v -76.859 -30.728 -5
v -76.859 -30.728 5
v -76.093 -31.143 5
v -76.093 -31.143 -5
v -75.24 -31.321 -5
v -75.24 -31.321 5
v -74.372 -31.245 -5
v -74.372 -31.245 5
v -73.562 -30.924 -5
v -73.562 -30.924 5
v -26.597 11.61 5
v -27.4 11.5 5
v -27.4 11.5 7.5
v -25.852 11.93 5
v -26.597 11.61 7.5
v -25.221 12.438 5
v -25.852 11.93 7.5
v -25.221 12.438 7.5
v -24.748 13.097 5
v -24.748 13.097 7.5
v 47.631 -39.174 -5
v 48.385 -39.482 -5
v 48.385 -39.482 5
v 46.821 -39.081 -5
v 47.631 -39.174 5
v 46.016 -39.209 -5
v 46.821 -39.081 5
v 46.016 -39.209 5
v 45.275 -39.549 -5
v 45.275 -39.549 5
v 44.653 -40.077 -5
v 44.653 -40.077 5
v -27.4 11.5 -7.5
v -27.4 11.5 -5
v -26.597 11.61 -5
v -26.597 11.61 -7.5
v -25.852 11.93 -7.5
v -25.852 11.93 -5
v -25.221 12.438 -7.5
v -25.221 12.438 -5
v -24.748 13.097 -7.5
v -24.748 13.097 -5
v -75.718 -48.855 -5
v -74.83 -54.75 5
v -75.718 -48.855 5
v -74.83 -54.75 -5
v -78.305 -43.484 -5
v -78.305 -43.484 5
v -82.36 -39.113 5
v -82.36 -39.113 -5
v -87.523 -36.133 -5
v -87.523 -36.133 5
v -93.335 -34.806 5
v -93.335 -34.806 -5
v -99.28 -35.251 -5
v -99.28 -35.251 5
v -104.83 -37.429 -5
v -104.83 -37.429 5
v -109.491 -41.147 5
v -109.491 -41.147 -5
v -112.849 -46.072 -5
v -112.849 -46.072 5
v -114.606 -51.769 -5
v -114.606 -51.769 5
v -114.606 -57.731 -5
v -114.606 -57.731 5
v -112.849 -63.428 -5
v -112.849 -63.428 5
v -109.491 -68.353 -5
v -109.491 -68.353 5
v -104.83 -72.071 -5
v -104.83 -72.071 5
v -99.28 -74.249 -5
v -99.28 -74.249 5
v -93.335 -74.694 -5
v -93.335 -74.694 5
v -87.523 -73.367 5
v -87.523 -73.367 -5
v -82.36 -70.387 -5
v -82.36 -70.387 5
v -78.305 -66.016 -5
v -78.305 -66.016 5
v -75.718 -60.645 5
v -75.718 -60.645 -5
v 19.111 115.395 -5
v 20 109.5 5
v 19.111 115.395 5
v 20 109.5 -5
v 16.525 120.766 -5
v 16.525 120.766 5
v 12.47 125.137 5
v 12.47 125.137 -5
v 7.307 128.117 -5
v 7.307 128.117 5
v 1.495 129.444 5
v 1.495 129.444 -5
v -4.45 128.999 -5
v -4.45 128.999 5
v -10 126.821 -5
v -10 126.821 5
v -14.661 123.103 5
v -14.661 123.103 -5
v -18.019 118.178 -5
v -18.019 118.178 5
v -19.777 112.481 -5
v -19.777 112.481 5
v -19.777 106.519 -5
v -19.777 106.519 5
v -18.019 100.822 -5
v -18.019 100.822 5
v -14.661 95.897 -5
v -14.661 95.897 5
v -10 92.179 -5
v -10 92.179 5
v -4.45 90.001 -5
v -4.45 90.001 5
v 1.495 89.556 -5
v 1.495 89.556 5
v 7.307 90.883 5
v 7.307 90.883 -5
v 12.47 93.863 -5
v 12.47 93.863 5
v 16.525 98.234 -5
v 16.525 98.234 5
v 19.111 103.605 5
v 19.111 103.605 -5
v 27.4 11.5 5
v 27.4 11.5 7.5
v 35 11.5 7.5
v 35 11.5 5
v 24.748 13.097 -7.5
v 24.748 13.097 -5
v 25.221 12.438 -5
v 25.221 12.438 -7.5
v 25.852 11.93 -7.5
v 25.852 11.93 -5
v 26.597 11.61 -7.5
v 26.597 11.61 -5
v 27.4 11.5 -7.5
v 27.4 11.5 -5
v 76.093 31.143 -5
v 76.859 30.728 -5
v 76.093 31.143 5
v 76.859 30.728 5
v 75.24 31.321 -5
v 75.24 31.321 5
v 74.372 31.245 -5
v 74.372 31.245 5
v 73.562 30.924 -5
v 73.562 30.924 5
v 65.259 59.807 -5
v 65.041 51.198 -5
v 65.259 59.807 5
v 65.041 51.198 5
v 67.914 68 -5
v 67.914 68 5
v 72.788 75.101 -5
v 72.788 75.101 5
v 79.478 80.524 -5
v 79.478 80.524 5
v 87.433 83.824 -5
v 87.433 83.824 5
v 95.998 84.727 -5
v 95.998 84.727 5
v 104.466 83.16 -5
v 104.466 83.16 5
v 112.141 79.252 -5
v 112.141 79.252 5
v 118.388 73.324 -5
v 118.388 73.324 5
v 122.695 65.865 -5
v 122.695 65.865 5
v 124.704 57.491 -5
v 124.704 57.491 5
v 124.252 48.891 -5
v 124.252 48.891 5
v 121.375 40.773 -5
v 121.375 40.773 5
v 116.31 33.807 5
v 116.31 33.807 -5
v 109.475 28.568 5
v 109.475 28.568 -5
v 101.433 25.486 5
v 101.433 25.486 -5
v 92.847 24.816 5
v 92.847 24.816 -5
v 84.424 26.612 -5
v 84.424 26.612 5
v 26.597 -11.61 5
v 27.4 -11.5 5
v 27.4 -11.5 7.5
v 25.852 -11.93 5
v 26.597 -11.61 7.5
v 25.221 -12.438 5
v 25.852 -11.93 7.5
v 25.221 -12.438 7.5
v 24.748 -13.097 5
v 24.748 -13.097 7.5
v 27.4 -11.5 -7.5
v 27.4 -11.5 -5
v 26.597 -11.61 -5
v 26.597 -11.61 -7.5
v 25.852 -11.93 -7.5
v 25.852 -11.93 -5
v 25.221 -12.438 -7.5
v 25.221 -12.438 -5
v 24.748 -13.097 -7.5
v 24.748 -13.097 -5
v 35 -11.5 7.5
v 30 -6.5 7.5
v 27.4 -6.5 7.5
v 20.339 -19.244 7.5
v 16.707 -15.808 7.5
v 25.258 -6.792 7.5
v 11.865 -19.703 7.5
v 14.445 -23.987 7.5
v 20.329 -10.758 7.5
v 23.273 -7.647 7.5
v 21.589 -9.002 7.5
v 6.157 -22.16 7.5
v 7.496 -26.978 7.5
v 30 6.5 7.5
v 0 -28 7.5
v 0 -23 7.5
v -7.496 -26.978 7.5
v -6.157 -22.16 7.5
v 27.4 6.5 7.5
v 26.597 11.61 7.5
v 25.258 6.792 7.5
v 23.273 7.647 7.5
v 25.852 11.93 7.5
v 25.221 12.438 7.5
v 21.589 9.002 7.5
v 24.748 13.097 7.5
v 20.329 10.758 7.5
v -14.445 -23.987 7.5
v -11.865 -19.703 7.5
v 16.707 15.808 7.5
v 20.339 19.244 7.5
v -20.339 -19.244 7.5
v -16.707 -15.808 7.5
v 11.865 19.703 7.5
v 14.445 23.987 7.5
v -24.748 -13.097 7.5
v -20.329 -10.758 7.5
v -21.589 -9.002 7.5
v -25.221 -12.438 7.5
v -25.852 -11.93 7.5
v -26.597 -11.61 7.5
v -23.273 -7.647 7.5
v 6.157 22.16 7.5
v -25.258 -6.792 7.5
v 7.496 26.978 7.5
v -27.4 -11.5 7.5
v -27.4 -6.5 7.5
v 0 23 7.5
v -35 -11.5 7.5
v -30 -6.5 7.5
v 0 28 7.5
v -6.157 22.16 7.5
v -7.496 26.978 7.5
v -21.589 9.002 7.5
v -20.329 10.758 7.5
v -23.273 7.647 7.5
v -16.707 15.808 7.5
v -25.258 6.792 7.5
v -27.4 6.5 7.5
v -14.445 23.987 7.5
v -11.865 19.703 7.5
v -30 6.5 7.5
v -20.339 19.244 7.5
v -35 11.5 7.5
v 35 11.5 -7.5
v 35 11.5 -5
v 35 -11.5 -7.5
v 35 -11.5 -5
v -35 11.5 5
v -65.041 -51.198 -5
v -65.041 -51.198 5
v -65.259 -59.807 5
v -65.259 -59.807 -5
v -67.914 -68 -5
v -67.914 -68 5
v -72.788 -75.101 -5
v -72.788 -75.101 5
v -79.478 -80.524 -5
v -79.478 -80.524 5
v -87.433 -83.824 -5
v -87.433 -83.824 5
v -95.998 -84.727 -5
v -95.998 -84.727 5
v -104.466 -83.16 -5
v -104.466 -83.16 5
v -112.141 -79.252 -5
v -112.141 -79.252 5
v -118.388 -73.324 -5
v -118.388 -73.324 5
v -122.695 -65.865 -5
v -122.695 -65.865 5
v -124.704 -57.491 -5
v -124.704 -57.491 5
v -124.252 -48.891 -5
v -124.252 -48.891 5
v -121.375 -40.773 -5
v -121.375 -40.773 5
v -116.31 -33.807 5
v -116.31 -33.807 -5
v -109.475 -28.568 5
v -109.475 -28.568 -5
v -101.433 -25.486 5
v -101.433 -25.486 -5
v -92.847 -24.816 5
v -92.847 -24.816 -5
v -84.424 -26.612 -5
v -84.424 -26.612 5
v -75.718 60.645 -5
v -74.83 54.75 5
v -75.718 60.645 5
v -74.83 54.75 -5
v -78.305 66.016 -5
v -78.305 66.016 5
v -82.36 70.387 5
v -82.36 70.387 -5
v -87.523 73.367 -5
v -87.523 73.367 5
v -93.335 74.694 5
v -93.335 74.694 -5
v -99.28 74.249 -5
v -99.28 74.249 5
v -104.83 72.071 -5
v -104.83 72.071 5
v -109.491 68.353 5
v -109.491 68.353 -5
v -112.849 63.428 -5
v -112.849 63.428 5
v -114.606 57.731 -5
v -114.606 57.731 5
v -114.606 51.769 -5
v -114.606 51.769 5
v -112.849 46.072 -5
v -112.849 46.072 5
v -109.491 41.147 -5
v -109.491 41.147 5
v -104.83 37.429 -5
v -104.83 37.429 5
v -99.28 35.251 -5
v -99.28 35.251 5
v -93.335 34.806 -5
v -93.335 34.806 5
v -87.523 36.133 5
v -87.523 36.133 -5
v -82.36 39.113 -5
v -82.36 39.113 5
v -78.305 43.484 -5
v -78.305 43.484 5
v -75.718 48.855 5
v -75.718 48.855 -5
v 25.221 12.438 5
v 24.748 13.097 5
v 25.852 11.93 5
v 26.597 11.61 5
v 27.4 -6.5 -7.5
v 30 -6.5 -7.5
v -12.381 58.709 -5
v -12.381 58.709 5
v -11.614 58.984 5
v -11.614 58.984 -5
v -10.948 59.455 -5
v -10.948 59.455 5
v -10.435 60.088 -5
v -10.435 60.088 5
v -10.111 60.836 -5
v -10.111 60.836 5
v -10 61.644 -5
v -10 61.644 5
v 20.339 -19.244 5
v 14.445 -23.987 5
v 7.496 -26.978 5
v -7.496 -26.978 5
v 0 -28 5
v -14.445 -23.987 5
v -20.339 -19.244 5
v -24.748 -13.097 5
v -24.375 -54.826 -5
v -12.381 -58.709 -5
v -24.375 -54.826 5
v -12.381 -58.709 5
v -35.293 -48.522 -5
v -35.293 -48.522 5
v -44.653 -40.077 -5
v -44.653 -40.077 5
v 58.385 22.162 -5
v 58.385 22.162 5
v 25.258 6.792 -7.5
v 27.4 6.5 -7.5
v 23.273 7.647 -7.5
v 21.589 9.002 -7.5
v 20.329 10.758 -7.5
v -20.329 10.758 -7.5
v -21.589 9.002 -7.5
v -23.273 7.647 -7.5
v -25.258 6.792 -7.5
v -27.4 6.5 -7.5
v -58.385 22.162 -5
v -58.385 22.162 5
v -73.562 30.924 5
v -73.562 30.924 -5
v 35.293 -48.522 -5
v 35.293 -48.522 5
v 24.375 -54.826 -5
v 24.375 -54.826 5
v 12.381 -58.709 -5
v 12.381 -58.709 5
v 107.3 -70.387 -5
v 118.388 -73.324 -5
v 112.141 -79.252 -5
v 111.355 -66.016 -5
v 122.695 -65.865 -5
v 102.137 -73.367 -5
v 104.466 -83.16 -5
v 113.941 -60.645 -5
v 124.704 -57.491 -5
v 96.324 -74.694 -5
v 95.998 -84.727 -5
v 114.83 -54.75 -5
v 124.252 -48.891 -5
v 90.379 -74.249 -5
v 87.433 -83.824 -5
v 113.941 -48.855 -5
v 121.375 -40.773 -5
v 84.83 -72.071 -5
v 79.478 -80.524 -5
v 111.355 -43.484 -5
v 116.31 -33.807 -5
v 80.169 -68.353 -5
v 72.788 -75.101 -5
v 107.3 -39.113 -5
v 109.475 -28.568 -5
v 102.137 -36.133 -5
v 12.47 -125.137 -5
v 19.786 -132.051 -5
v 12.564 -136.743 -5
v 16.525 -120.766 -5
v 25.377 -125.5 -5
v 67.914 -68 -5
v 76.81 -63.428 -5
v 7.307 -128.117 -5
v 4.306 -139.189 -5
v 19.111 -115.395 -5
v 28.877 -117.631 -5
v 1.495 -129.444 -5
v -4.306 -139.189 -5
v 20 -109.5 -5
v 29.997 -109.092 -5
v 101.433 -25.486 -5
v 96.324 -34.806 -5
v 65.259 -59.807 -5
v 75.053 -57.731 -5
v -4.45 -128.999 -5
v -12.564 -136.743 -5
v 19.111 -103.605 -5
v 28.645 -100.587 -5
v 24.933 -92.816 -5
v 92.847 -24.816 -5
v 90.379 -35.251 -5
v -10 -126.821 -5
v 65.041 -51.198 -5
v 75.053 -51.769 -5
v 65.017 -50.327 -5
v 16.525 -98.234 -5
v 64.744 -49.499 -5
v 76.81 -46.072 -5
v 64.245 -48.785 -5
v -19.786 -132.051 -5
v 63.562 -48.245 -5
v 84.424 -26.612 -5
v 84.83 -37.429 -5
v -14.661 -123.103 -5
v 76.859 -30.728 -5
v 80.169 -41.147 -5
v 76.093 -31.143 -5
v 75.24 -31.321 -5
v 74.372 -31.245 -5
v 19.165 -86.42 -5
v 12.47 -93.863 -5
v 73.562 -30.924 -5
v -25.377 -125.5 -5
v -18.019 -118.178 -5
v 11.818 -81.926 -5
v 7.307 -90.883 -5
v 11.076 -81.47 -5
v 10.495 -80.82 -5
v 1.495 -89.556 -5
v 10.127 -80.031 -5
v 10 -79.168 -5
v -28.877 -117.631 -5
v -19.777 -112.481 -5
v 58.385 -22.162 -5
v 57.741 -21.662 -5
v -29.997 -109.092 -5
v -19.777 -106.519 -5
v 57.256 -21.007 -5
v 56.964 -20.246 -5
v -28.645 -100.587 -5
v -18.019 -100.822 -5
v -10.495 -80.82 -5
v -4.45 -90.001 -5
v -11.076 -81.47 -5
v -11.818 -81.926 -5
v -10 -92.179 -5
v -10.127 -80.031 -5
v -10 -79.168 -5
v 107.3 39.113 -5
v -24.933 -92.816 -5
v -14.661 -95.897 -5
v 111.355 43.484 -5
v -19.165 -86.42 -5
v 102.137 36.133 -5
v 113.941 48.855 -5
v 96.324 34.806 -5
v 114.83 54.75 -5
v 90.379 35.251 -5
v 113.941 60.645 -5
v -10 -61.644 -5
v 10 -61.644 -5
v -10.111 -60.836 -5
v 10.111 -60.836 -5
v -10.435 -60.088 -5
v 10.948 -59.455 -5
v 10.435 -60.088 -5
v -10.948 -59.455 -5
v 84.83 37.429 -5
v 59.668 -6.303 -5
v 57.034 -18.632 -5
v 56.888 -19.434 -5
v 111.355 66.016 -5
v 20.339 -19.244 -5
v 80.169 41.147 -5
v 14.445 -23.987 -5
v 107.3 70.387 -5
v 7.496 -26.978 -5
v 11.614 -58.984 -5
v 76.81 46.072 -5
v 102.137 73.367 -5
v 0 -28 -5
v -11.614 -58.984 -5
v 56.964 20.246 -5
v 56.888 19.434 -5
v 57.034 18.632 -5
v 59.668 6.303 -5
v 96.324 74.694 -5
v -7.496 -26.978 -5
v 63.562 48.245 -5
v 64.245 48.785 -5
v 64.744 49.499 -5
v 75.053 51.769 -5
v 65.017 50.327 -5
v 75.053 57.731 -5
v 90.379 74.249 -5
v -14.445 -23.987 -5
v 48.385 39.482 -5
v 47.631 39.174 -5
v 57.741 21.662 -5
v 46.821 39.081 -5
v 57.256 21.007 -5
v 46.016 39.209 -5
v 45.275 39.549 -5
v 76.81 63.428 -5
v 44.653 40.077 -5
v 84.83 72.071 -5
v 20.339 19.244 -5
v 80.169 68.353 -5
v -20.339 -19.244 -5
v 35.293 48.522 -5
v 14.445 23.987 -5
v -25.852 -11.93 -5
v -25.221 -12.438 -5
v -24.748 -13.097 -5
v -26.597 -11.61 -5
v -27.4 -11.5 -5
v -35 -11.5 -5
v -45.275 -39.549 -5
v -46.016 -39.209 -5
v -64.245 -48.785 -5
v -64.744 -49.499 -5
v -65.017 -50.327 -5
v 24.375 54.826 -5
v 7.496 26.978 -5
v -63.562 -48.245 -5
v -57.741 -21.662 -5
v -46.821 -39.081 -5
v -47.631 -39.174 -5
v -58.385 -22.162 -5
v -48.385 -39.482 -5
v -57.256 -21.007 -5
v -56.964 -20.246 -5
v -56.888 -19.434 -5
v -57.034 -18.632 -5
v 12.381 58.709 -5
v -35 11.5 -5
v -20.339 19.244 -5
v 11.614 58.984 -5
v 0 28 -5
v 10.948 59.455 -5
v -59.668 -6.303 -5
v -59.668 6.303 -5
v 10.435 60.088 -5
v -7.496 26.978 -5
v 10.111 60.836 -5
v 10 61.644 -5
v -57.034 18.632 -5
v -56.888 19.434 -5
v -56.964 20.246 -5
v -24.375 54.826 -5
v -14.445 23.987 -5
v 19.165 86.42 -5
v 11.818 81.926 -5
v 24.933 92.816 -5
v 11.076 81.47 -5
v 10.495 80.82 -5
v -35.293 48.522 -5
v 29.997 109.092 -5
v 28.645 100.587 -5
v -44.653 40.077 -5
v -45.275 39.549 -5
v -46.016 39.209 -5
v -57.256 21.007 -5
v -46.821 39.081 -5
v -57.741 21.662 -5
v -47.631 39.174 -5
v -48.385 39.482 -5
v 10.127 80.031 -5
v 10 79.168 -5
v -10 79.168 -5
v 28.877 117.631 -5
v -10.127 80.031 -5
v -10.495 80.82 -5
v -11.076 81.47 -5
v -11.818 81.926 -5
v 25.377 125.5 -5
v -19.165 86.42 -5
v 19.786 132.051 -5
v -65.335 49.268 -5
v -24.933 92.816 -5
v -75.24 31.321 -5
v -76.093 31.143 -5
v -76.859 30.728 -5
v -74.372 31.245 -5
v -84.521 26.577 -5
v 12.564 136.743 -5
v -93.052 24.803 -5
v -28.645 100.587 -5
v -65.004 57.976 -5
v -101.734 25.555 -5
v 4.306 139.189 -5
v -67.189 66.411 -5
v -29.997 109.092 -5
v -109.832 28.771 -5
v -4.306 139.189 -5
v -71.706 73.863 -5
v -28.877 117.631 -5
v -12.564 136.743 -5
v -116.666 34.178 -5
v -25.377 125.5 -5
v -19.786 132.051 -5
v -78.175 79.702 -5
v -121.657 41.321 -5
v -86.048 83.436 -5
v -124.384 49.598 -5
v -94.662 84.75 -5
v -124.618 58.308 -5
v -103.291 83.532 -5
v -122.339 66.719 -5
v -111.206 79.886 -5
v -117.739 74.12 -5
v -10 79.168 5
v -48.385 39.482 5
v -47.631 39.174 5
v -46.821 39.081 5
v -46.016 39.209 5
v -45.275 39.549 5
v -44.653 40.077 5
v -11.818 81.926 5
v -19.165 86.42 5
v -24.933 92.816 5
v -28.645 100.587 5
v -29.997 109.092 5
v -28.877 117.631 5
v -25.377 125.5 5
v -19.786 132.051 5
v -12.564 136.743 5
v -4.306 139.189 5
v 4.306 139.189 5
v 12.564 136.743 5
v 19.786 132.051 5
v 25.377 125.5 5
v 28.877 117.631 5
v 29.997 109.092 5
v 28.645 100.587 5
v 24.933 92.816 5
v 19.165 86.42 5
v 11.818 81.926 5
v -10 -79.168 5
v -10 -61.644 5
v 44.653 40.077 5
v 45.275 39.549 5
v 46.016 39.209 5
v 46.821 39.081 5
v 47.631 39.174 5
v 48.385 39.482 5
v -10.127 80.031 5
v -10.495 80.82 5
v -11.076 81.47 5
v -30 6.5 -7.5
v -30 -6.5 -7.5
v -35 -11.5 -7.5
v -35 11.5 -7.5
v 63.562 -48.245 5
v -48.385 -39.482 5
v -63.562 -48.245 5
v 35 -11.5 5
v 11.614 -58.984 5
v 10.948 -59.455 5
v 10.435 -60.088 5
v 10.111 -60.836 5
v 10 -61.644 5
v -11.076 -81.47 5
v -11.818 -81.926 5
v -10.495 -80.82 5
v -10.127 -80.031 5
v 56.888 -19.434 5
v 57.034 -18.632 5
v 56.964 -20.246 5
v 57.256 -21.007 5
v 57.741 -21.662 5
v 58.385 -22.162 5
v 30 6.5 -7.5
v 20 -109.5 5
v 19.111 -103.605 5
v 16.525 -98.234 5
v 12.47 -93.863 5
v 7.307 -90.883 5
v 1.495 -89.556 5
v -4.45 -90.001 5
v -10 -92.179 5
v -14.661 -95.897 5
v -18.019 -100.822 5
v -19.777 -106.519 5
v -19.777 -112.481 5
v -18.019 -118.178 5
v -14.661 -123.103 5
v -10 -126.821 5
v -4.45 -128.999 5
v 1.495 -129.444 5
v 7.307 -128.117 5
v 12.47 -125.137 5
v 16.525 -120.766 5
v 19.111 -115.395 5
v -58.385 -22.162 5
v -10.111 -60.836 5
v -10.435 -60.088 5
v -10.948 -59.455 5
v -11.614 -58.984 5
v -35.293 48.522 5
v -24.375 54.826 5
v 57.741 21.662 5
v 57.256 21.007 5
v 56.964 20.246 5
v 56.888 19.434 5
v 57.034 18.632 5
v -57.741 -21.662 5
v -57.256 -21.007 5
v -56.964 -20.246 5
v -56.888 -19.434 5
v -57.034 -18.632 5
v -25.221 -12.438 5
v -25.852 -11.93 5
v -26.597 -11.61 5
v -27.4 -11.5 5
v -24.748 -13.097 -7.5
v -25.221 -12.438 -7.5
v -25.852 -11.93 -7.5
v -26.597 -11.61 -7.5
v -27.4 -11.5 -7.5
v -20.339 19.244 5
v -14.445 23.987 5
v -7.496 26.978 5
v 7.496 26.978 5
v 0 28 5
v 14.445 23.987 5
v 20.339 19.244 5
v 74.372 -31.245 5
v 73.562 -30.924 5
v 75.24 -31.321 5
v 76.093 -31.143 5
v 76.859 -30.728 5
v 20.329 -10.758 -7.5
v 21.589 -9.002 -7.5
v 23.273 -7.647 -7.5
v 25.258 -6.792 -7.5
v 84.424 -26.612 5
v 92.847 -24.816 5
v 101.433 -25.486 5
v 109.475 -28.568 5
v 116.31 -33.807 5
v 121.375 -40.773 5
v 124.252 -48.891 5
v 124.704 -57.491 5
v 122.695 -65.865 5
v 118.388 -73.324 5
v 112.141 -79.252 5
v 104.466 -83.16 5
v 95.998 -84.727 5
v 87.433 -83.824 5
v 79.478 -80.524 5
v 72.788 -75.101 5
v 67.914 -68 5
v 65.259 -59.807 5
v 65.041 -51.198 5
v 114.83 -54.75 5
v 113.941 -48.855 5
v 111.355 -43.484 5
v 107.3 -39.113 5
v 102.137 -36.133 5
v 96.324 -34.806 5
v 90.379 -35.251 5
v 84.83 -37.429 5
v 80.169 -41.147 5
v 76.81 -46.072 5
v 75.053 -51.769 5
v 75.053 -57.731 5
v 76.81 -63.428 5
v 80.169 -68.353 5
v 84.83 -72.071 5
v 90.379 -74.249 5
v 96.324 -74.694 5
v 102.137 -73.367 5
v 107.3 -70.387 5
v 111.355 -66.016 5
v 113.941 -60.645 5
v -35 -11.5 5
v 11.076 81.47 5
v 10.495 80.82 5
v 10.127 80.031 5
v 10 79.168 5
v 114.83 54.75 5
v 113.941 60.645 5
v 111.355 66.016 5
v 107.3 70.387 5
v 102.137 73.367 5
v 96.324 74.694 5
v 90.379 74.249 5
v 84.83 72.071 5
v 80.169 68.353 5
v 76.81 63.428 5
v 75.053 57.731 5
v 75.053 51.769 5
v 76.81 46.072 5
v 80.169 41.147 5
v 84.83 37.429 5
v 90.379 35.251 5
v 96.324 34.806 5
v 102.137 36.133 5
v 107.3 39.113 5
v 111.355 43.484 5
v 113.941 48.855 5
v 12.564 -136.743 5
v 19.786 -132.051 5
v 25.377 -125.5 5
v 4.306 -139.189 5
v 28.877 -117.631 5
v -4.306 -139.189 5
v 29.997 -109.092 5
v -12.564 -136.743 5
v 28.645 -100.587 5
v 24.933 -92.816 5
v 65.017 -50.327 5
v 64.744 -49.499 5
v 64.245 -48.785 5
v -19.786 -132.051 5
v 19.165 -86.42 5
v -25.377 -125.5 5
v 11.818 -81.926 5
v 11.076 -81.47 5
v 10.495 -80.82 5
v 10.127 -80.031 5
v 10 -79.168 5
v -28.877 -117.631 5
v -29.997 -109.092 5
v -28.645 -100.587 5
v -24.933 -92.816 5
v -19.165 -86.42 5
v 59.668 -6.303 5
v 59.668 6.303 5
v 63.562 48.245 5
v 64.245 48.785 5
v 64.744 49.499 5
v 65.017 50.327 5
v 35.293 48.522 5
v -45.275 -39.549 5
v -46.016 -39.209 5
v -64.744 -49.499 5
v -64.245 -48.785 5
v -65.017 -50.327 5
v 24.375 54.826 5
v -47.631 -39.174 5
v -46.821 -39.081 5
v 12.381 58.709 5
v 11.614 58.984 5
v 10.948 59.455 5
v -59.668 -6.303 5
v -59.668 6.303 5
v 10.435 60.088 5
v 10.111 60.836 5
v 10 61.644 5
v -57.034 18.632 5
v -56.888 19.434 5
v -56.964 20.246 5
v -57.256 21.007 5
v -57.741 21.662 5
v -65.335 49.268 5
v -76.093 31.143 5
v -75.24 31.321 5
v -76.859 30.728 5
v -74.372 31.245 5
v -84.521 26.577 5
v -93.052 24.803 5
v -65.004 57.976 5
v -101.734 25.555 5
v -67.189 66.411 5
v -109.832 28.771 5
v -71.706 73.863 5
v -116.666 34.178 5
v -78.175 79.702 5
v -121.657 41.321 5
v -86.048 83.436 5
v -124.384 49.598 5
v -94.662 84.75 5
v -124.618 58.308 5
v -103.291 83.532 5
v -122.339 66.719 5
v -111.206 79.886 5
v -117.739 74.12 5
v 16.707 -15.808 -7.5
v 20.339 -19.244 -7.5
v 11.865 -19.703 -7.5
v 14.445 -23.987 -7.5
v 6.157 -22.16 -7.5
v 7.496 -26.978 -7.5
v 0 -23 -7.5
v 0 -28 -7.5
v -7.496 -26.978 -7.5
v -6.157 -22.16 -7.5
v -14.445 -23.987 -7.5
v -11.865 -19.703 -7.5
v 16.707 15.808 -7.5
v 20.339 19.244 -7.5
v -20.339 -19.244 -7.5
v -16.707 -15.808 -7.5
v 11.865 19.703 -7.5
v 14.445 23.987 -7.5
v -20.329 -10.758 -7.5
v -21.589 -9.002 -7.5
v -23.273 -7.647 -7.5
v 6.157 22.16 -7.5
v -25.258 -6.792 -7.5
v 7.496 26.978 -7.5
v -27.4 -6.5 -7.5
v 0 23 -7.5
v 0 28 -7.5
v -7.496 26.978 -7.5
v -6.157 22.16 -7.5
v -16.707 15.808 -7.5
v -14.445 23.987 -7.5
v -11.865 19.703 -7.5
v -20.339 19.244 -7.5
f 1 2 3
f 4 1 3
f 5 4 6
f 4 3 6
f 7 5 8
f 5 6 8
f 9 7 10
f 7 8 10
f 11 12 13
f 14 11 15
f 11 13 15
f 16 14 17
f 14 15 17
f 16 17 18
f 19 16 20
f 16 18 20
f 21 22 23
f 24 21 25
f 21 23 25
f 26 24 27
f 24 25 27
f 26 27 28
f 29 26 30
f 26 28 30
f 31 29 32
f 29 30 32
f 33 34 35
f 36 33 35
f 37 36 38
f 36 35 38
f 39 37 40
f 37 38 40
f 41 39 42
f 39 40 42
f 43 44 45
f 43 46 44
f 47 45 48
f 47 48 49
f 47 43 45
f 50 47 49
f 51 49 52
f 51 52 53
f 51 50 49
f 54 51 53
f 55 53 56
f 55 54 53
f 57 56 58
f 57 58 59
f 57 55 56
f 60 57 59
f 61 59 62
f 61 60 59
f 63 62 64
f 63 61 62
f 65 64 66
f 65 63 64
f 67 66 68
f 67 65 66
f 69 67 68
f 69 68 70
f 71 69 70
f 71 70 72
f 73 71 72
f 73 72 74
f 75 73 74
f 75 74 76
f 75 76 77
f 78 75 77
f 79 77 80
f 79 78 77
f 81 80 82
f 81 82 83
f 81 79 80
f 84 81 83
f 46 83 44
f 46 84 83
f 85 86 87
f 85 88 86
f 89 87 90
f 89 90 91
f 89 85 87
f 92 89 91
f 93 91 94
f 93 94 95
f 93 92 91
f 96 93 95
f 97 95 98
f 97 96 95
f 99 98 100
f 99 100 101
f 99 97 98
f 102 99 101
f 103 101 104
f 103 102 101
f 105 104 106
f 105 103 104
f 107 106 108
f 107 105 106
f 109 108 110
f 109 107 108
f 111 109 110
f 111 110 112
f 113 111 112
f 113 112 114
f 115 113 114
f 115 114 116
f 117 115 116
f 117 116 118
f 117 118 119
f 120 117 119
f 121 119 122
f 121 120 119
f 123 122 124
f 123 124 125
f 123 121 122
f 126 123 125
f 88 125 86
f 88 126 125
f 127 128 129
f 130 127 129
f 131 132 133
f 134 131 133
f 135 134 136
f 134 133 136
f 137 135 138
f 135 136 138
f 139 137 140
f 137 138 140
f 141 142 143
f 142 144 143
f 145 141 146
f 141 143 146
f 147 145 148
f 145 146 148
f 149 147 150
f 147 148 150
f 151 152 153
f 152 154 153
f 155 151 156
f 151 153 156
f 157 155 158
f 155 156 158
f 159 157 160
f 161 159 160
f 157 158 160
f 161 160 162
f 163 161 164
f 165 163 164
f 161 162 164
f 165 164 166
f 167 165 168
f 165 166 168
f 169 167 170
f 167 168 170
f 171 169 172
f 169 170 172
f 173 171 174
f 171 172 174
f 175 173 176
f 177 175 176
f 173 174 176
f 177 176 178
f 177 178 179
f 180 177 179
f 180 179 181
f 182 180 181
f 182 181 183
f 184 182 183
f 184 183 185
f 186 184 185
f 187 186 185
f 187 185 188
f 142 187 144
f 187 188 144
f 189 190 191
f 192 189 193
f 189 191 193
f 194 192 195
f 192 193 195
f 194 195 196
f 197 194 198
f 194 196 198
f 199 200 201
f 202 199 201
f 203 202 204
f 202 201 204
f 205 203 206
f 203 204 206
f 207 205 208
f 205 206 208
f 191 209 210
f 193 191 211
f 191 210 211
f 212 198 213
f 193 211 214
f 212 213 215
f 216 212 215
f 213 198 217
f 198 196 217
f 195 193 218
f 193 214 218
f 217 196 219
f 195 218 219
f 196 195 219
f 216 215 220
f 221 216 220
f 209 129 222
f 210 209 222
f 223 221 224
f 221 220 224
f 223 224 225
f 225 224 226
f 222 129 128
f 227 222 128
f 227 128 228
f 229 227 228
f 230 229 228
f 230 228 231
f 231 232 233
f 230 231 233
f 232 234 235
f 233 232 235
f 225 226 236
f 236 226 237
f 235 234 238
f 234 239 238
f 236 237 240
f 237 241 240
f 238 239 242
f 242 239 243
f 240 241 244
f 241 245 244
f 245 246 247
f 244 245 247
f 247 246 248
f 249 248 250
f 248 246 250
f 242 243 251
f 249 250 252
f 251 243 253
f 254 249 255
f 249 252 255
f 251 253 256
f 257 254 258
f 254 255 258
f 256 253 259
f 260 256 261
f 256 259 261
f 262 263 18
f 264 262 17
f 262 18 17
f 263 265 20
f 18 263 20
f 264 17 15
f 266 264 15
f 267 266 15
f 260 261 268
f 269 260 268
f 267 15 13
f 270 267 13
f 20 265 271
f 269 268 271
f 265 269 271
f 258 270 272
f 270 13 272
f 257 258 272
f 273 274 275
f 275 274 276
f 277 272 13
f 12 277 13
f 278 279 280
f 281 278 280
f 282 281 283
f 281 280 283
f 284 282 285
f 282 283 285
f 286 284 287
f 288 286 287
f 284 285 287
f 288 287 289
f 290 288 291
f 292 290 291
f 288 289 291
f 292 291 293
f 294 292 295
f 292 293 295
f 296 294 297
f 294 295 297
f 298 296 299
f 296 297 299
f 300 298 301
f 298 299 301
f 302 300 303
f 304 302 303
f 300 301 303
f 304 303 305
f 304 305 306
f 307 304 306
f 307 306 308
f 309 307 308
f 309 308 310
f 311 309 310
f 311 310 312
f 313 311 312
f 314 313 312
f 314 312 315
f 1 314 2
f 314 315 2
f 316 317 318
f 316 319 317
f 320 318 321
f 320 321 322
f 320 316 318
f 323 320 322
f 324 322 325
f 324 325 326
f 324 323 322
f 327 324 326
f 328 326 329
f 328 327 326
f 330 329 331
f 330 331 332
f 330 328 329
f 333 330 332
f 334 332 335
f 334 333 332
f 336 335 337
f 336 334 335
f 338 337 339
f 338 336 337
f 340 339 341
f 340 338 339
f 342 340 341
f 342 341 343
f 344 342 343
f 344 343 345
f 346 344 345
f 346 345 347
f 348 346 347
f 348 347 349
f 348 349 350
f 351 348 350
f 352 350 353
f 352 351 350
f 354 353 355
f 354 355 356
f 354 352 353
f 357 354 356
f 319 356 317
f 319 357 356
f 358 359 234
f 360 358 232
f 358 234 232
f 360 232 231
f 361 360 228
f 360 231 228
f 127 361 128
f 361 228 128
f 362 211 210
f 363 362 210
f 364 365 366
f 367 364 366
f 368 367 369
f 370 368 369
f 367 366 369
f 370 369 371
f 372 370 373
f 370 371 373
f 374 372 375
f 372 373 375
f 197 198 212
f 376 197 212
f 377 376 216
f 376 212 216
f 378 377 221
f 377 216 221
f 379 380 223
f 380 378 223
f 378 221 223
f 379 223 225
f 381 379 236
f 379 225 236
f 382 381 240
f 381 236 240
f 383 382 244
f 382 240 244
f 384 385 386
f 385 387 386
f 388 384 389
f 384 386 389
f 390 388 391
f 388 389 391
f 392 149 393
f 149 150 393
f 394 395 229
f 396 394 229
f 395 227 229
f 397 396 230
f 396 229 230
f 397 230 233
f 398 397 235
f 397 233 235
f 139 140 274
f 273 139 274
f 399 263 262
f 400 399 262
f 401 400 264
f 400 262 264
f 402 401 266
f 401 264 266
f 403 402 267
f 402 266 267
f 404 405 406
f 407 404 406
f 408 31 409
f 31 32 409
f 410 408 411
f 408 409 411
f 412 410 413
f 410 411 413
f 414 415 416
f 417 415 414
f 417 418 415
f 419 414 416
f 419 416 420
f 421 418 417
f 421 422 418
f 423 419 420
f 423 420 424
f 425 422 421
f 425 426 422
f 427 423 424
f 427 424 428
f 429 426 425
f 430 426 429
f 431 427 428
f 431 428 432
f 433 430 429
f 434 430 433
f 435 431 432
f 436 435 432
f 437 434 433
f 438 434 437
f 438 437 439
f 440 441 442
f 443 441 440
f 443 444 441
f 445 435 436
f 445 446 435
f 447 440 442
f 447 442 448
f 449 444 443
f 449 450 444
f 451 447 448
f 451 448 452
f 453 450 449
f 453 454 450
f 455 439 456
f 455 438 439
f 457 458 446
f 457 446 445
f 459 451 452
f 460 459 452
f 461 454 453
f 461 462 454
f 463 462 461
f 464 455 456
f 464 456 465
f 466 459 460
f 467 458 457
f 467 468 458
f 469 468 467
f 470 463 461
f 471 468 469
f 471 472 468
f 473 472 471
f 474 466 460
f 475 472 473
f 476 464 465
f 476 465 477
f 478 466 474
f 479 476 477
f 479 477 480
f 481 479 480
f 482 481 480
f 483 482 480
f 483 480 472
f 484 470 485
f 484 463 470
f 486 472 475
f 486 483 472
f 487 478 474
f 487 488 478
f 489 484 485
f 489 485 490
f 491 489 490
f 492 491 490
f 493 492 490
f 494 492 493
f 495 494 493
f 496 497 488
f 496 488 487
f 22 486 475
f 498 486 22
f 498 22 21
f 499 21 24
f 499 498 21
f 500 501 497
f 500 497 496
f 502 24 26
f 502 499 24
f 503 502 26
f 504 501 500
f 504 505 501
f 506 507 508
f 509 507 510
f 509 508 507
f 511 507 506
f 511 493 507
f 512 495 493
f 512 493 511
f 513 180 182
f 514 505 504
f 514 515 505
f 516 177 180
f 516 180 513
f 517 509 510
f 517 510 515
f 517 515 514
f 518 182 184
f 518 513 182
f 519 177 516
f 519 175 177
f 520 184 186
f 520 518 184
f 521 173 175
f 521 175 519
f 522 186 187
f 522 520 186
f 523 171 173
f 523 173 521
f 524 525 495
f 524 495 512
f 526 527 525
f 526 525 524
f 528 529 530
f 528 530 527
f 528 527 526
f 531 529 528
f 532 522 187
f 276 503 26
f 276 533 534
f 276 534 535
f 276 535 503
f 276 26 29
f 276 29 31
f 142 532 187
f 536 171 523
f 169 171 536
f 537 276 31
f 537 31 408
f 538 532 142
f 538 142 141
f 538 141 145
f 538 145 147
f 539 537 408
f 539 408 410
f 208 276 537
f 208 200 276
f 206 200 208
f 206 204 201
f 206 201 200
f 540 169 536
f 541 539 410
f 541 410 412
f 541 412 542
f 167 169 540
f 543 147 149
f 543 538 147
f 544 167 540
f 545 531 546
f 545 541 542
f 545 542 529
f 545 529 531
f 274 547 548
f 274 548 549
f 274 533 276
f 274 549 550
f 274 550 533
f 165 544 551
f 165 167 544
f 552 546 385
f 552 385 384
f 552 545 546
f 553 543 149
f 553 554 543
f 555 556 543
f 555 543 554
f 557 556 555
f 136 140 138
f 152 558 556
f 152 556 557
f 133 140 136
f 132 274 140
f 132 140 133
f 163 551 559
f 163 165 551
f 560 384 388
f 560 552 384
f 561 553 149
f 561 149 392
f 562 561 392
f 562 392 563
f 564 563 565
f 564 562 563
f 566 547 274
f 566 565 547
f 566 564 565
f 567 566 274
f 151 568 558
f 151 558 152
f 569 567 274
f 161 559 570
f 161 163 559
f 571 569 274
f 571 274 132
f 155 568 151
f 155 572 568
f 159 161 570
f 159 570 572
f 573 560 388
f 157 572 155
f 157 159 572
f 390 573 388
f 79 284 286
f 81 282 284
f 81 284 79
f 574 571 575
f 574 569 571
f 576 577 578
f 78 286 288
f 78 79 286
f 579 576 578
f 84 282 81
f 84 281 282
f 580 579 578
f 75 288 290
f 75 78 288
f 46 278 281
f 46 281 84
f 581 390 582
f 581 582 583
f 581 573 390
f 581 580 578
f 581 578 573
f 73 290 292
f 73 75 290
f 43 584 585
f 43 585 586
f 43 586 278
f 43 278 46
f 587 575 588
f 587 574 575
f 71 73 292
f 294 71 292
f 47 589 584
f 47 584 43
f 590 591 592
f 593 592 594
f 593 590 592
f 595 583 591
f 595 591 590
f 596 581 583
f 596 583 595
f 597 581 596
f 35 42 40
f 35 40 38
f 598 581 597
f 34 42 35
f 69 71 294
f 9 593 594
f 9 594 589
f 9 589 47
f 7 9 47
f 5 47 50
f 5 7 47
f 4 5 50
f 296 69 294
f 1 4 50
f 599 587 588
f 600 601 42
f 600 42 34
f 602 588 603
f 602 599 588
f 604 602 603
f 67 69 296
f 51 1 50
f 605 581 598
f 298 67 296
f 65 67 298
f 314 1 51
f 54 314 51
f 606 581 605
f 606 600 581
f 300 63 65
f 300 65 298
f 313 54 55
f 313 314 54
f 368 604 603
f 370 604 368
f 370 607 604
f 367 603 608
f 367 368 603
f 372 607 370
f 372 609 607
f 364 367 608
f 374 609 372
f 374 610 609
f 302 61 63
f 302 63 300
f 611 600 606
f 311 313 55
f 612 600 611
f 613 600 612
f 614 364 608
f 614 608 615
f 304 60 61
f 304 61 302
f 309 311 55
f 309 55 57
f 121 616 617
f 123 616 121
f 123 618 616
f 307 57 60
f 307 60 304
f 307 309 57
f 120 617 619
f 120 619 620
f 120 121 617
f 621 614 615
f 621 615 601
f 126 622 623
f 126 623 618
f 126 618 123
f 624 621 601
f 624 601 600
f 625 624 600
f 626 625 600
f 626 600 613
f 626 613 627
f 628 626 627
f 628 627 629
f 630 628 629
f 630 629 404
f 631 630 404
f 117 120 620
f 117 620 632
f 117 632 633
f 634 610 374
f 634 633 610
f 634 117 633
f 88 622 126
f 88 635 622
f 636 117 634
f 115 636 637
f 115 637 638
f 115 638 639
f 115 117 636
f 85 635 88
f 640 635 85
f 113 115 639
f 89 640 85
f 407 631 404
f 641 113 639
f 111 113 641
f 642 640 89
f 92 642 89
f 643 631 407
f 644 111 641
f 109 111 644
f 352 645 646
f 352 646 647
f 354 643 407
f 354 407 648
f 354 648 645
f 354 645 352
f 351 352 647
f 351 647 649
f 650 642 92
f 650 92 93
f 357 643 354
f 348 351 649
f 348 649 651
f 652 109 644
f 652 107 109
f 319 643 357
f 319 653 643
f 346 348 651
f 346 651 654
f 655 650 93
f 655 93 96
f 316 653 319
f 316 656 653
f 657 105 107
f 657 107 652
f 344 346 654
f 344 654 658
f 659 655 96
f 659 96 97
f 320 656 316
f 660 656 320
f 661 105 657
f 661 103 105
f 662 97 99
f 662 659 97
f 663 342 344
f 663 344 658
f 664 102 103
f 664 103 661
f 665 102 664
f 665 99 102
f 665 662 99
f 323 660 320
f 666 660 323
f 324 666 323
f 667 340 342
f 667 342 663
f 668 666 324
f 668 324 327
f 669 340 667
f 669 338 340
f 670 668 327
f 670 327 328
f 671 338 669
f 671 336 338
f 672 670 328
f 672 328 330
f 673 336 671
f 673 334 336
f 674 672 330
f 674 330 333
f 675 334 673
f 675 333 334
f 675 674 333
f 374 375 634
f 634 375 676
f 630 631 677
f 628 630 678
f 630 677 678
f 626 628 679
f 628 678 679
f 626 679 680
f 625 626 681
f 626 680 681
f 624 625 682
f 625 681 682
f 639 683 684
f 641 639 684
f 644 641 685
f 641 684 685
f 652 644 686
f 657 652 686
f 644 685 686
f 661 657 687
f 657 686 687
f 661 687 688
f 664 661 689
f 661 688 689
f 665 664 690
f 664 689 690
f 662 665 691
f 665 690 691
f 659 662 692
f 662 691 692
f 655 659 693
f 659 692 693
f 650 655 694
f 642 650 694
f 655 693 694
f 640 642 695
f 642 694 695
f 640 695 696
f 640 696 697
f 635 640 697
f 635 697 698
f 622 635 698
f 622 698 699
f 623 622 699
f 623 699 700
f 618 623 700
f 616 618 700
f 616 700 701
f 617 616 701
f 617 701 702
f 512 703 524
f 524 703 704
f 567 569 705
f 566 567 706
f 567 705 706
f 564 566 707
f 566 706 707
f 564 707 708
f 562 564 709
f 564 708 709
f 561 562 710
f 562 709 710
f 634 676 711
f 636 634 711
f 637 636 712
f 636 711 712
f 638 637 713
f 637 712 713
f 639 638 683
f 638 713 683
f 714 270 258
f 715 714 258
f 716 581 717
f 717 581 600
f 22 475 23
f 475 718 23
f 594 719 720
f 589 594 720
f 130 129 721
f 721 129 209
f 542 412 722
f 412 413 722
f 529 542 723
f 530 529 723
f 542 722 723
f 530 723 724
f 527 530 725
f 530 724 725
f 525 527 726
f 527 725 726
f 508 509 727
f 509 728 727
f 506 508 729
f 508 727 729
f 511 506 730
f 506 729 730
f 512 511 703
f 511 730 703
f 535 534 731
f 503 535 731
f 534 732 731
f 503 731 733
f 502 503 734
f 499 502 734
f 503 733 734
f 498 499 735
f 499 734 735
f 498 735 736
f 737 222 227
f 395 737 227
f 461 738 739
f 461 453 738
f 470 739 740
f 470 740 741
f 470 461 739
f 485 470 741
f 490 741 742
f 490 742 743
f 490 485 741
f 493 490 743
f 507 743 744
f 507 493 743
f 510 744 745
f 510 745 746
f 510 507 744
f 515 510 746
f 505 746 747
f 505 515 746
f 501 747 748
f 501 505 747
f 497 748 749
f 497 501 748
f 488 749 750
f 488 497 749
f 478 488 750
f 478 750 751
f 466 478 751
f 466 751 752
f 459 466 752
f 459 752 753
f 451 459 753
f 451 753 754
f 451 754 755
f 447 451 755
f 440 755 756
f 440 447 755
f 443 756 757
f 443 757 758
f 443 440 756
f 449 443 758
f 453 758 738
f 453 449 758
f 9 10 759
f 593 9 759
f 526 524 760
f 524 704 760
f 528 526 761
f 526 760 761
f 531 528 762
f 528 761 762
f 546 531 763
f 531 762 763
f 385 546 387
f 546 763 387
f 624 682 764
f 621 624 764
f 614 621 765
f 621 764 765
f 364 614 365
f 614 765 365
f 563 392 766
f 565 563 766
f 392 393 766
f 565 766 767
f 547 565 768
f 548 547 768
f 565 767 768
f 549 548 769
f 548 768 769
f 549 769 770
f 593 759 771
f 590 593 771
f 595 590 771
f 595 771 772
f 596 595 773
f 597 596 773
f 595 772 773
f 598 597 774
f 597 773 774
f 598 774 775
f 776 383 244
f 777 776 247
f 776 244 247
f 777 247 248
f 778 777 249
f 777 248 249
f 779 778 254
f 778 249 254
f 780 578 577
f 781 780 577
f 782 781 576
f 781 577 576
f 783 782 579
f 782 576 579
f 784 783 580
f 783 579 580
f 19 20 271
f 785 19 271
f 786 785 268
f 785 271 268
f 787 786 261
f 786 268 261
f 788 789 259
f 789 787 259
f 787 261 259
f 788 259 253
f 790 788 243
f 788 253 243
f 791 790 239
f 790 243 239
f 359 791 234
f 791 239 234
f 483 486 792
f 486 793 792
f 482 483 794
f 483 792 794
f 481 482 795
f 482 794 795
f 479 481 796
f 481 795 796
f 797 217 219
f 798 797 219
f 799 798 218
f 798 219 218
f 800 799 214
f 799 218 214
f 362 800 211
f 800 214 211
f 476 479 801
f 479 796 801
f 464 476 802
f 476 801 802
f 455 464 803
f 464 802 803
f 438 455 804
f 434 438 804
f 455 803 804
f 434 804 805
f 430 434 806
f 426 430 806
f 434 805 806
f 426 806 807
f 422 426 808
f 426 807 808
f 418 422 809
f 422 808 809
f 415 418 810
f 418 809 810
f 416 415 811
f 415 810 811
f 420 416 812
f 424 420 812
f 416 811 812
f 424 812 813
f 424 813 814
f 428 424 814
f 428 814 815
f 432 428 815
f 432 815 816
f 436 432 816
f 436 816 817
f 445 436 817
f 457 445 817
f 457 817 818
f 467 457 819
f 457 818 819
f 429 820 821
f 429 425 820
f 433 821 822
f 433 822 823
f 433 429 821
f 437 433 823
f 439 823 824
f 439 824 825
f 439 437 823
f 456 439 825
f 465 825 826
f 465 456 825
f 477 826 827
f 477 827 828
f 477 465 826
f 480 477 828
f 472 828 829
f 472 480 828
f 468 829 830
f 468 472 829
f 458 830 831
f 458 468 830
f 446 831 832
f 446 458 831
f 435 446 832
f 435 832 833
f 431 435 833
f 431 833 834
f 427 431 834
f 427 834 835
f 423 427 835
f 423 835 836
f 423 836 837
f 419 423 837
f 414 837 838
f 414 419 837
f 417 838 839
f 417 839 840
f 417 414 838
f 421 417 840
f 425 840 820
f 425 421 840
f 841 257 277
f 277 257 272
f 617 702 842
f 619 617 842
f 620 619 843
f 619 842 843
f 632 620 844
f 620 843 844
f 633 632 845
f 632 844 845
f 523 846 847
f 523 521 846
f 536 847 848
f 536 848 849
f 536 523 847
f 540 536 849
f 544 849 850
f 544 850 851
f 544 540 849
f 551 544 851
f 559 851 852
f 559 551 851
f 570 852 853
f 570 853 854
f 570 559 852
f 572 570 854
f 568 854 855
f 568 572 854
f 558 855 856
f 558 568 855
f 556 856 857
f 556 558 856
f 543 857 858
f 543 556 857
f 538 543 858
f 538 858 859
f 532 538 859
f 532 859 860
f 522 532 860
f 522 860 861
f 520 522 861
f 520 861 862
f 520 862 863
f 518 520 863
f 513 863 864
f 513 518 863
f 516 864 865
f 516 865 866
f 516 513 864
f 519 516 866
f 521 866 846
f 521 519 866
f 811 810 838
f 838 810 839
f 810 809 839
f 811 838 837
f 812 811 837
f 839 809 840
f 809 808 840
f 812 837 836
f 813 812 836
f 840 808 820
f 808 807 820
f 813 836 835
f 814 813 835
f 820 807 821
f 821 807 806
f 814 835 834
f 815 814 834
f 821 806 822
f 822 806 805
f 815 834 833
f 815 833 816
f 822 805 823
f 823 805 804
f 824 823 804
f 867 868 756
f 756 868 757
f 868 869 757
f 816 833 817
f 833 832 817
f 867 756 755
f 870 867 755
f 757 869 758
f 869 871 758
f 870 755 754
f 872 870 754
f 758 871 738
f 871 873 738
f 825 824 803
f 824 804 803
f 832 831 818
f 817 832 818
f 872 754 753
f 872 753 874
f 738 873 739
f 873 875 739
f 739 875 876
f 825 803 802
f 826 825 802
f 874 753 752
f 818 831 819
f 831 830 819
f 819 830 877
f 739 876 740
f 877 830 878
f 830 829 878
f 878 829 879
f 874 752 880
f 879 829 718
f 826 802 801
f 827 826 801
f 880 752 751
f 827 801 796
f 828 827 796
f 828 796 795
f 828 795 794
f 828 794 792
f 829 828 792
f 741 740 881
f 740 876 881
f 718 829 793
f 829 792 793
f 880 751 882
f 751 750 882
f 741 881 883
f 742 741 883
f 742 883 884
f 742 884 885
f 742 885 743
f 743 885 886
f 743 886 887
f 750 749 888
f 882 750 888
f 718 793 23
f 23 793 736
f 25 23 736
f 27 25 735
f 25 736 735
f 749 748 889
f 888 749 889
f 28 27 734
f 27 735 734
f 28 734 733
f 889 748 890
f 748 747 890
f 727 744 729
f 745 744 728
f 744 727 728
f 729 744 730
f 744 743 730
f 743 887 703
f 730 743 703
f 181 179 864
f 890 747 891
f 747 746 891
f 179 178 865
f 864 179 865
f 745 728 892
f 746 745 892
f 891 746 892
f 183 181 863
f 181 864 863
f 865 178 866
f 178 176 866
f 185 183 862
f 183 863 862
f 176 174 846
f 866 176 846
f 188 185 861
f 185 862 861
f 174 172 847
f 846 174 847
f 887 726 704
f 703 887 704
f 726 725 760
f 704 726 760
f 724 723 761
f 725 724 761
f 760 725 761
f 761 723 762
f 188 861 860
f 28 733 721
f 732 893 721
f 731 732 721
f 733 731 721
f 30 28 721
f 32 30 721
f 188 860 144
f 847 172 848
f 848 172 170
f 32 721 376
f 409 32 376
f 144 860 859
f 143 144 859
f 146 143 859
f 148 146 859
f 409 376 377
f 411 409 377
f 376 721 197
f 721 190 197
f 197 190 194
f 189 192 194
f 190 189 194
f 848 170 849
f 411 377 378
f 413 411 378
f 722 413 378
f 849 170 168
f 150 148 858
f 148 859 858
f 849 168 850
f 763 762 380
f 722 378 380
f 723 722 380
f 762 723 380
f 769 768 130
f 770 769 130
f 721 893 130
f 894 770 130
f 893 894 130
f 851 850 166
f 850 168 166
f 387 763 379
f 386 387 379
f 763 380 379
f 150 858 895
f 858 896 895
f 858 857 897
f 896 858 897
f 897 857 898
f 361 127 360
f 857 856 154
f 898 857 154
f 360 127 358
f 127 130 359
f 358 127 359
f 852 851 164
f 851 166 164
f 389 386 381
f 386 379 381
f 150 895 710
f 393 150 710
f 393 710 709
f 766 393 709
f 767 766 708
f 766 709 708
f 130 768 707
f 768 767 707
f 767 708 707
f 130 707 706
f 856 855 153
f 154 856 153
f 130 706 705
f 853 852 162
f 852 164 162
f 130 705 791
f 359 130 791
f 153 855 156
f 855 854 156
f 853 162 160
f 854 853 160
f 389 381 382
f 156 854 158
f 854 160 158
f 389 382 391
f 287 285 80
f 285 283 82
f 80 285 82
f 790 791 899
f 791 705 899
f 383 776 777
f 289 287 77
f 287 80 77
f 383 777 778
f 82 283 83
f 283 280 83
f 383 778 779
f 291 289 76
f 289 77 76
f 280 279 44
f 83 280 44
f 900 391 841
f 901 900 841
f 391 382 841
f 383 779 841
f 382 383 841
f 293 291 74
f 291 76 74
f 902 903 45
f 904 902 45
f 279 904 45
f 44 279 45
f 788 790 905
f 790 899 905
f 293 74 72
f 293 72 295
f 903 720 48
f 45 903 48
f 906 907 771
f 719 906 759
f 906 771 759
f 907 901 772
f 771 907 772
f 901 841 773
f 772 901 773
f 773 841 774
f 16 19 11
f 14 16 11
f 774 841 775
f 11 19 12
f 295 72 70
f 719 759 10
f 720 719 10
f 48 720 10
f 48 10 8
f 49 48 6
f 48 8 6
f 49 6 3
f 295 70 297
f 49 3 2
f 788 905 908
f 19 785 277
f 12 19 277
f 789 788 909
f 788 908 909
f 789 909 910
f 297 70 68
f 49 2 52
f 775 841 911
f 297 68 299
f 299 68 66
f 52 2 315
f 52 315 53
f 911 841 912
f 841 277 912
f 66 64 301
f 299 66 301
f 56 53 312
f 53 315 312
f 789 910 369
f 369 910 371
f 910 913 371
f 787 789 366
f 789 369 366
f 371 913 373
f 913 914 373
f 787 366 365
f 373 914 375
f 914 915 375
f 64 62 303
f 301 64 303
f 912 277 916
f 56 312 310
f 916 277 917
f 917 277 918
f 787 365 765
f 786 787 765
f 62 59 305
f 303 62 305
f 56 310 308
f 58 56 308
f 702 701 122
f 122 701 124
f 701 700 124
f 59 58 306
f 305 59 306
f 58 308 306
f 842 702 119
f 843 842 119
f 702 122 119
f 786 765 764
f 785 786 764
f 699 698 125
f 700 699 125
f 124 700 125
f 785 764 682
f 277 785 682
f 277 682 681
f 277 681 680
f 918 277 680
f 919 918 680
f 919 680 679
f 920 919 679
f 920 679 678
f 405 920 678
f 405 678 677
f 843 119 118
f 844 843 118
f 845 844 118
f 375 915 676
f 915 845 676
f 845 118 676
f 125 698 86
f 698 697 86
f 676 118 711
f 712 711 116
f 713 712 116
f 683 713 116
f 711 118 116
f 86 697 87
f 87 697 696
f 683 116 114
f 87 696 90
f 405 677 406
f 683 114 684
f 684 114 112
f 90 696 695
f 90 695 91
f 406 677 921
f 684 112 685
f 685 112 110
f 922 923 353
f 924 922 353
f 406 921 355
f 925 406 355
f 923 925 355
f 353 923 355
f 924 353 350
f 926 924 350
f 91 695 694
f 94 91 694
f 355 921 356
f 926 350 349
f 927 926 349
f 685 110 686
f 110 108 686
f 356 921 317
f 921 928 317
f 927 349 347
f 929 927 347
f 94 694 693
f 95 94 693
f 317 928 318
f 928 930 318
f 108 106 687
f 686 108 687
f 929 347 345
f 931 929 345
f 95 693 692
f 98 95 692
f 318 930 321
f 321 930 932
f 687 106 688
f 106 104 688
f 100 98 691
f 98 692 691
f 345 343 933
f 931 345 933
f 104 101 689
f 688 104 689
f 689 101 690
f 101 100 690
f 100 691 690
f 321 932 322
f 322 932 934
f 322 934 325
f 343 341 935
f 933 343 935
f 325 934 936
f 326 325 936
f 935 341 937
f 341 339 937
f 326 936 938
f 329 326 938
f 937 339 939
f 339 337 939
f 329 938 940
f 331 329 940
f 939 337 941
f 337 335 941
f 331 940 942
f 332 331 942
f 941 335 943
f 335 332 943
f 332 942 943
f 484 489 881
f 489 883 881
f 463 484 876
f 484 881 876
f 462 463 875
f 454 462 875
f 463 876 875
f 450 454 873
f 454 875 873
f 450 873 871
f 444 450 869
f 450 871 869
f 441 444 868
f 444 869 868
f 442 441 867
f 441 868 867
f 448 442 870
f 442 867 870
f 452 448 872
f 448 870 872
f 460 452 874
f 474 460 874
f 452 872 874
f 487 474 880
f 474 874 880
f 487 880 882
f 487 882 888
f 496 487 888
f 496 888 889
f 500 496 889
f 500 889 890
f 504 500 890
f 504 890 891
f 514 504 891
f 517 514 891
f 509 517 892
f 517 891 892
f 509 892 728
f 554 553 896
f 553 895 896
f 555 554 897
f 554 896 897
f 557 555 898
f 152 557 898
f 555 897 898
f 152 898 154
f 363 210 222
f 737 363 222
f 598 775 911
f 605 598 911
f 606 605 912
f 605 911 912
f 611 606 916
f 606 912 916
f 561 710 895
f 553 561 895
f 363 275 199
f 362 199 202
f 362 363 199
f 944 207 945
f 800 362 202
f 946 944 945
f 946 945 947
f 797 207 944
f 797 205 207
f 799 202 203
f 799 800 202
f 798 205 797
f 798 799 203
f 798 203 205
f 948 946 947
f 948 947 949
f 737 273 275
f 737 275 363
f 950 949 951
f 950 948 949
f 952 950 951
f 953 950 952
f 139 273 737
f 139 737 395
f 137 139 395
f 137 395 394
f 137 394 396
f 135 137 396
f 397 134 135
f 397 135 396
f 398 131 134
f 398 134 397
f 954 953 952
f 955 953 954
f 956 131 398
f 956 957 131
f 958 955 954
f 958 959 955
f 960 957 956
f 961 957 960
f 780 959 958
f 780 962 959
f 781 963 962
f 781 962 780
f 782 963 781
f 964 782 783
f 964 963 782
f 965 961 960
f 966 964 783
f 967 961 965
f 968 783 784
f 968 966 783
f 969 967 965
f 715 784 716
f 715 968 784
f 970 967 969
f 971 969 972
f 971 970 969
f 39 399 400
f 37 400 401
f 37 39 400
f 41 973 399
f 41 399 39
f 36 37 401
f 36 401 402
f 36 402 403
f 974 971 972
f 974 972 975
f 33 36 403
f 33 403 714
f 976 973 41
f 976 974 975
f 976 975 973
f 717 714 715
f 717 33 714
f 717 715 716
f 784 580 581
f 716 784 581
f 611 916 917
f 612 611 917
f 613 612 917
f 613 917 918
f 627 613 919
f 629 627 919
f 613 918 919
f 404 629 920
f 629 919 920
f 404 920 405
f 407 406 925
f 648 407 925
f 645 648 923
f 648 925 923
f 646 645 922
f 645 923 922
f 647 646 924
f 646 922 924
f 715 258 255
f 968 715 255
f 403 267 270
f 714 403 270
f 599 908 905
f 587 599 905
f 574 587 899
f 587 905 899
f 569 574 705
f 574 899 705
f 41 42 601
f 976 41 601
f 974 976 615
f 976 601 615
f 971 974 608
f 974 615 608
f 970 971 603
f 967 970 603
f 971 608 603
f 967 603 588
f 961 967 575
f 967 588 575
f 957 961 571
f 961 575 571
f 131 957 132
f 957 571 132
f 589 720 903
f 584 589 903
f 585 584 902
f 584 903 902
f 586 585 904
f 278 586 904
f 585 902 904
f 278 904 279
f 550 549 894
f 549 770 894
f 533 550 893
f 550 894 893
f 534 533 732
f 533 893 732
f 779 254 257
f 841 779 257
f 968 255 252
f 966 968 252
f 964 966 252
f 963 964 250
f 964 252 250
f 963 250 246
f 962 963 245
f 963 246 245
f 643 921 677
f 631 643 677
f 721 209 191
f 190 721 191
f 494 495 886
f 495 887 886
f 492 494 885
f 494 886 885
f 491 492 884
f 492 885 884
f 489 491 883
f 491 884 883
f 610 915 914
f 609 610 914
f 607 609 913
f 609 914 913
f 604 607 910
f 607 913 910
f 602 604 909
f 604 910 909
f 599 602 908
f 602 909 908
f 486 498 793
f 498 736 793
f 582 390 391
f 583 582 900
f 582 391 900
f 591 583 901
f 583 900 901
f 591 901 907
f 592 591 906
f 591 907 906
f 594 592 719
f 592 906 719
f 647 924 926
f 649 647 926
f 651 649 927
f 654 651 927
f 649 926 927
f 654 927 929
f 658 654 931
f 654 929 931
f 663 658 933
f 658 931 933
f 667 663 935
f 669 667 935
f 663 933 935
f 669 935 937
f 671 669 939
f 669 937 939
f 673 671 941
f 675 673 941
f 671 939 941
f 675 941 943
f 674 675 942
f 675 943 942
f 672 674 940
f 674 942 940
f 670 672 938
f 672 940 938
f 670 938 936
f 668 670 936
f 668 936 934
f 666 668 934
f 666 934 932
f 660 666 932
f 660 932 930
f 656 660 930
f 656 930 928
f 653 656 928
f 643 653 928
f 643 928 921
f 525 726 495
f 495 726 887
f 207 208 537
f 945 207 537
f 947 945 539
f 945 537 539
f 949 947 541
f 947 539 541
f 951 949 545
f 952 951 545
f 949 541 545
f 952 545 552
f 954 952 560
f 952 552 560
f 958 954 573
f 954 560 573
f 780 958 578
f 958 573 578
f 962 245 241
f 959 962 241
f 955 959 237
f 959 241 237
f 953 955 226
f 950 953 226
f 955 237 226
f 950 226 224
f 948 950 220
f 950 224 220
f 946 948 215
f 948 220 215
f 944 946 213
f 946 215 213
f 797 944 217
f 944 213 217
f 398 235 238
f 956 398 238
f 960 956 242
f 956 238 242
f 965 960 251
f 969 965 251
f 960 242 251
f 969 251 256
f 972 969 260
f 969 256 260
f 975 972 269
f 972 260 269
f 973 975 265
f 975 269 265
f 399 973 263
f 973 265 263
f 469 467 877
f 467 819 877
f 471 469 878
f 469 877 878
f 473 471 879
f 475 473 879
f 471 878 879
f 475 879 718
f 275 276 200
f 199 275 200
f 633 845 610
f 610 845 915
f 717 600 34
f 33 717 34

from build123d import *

# Parameters (mm, degrees)
BOSS_EXTRUDE1_DEPTH = 7.5
SKETCH1_3_R         = 20
BOSS_EXTRUDE2_DEPTH = 5


with BuildPart() as part:
    # Sketch1 → Boss-Extrude1 (new, symmetric)
    with BuildSketch(Plane.XY):
        with BuildLine():
            ThreePointArc((-24.748222274, 13.096774194), (-25.852186654, 11.930011924), (-27.399817518, 11.5))
            Line((-27.399817518, 11.5), (-35, 11.5))
            Line((-35, 11.5), (-35, -11.5))
            Line((-35, -11.5), (-27.399817518, -11.5))
            ThreePointArc((-27.399817518, -11.5), (-25.852186654, -11.930011924), (-24.748222274, -13.096774194))
            ThreePointArc((-24.748222274, -13.096774194), (0, -28), (24.748222274, -13.096774194))
            ThreePointArc((24.748222274, -13.096774194), (25.852186654, -11.930011924), (27.399817518, -11.5))
            Line((27.399817518, -11.5), (35, -11.5))
            Line((35, -11.5), (35, 11.5))
            Line((35, 11.5), (27.399817518, 11.5))
            ThreePointArc((27.399817518, 11.5), (25.852186654, 11.930011924), (24.748222274, 13.096774194))
            ThreePointArc((24.748222274, 13.096774194), (0, 28), (-24.748222274, 13.096774194))
        make_face()
        with BuildLine():
            Line((-30, 6.5), (-27.399817518, 6.5))
            ThreePointArc((-27.399817518, 6.5), (-23.272801881, 7.646698465), (-20.328896868, 10.758064516))
            ThreePointArc((-20.328896868, 10.758064516), (0, 23), (20.328896868, 10.758064516))
            ThreePointArc((20.328896868, 10.758064516), (23.272801881, 7.646698465), (27.399817518, 6.5))
            Line((27.399817518, 6.5), (30, 6.5))
            Line((30, 6.5), (30, -6.5))
            Line((30, -6.5), (27.399817518, -6.5))
            ThreePointArc((27.399817518, -6.5), (23.272801881, -7.646698465), (20.328896868, -10.758064516))
            ThreePointArc((20.328896868, -10.758064516), (0, -23), (-20.328896868, -10.758064516))
            ThreePointArc((-20.328896868, -10.758064516), (-23.272801881, -7.646698465), (-27.399817518, -6.5))
            Line((-27.399817518, -6.5), (-30, -6.5))
            Line((-30, -6.5), (-30, 6.5))
        make_face(mode=Mode.SUBTRACT)
    extrude(amount=BOSS_EXTRUDE1_DEPTH, both=True)

    # Sketch1<3> → Boss-Extrude2 (add, symmetric)
    with BuildSketch(Plane.XY):
        with BuildLine():
            Line((63.561930641, 48.24450315), (48.38539126, 39.482324053))
            ThreePointArc((48.38539126, 39.482324053), (46.413721828, 39.117710954), (44.652753581, 40.07657168))
            ThreePointArc((44.652753581, 40.07657168), (30, 51.961524227), (12.380952381, 58.70870479))
            ThreePointArc((12.380952381, 58.70870479), (10.67007051, 59.754317665), (10, 61.64414003))
            Line((10, 61.64414003), (10, 79.168498224))
            ThreePointArc((10, 79.168498224), (10.49545867, 80.819943871), (11.818181818, 81.925907476))
            ThreePointArc((11.818181818, 81.925907476), (0, 139.5), (-11.818181818, 81.925907476))
            ThreePointArc((-11.818181818, 81.925907476), (-10.49545867, 80.819943871), (-10, 79.168498224))
            Line((-10, 79.168498224), (-10, 61.64414003))
            ThreePointArc((-10, 61.64414003), (-10.67007051, 59.754317665), (-12.380952381, 58.70870479))
            ThreePointArc((-12.380952381, 58.70870479), (-30, 51.961524227), (-44.652753581, 40.07657168))
            ThreePointArc((-44.652753581, 40.07657168), (-46.413721828, 39.117710954), (-48.38539126, 39.482324053))
            Line((-48.38539126, 39.482324053), (-65.334884287, 49.268118414))
            ThreePointArc((-65.334884287, 49.268118414), (-120.308802103, 70.587282596), (-76.859008012, 30.728108057))
            ThreePointArc((-76.859008012, 30.728108057), (-75.23985386, 31.320638103), (-73.561930641, 30.923995074))
            Line((-73.561930641, 30.923995074), (-58.38539126, 22.161815977))
            ThreePointArc((-58.38539126, 22.161815977), (-57.083792338, 20.636606711), (-57.033705962, 18.63213311))
            ThreePointArc((-57.033705962, 18.63213311), (-60, 0), (-57.033705962, -18.63213311))
            ThreePointArc((-57.033705962, -18.63213311), (-57.083792338, -20.636606711), (-58.38539126, -22.161815977))
            Line((-58.38539126, -22.161815977), (-73.561930641, -30.923995074))
            ThreePointArc((-73.561930641, -30.923995074), (-75.23985386, -31.320638103), (-76.859008012, -30.728108057))
            ThreePointArc((-76.859008012, -30.728108057), (-120.810543828, -69.75), (-65.040826193, -51.197799419))
            ThreePointArc((-65.040826193, -51.197799419), (-64.74439519, -49.499305768), (-63.561930641, -48.24450315))
            Line((-63.561930641, -48.24450315), (-48.38539126, -39.482324053))
            ThreePointArc((-48.38539126, -39.482324053), (-46.413721828, -39.117710954), (-44.652753581, -40.07657168))
            ThreePointArc((-44.652753581, -40.07657168), (-30, -51.961524227), (-12.380952381, -58.70870479))
            ThreePointArc((-12.380952381, -58.70870479), (-10.67007051, -59.754317665), (-10, -61.64414003))
            Line((-10, -61.64414003), (-10, -79.168498224))
            ThreePointArc((-10, -79.168498224), (-10.49545867, -80.819943871), (-11.818181818, -81.925907476))
            ThreePointArc((-11.818181818, -81.925907476), (0, -139.5), (11.818181818, -81.925907476))
            ThreePointArc((11.818181818, -81.925907476), (10.49545867, -80.819943871), (10, -79.168498224))
            Line((10, -79.168498224), (10, -61.64414003))
            ThreePointArc((10, -61.64414003), (10.67007051, -59.754317665), (12.380952381, -58.70870479))
            ThreePointArc((12.380952381, -58.70870479), (30, -51.961524227), (44.652753581, -40.07657168))
            ThreePointArc((44.652753581, -40.07657168), (46.413721828, -39.117710954), (48.38539126, -39.482324053))
            Line((48.38539126, -39.482324053), (63.561930641, -48.24450315))
            ThreePointArc((63.561930641, -48.24450315), (64.74439519, -49.499305768), (65.040826193, -51.197799419))
            ThreePointArc((65.040826193, -51.197799419), (120.810543828, -69.75), (76.859008012, -30.728108057))
            ThreePointArc((76.859008012, -30.728108057), (75.23985386, -31.320638103), (73.561930641, -30.923995074))
            Line((73.561930641, -30.923995074), (58.38539126, -22.161815977))
            ThreePointArc((58.38539126, -22.161815977), (57.083792338, -20.636606711), (57.033705962, -18.63213311))
            ThreePointArc((57.033705962, -18.63213311), (60, 0), (57.033705962, 18.63213311))
            ThreePointArc((57.033705962, 18.63213311), (57.083792338, 20.636606711), (58.38539126, 22.161815977))
            Line((58.38539126, 22.161815977), (73.561930641, 30.923995074))
            ThreePointArc((73.561930641, 30.923995074), (75.23985386, 31.320638103), (76.859008012, 30.728108057))
            ThreePointArc((76.859008012, 30.728108057), (120.810543828, 69.75), (65.040826193, 51.197799419))
            ThreePointArc((65.040826193, 51.197799419), (64.74439519, 49.499305768), (63.561930641, 48.24450315))
        make_face()
        with Locations((0, -109.5)):
            Circle(SKETCH1_3_R, mode=Mode.SUBTRACT)
        with Locations((-94.829781714, -54.75)):
            Circle(SKETCH1_3_R, mode=Mode.SUBTRACT)
        with BuildLine():
            Line((-35, 11.5), (-27.399817518, 11.5))
            ThreePointArc((-27.399817518, 11.5), (-25.852186654, 11.930011924), (-24.748222274, 13.096774194))
            ThreePointArc((-24.748222274, 13.096774194), (0, 28), (24.748222274, 13.096774194))
            ThreePointArc((24.748222274, 13.096774194), (25.852186654, 11.930011924), (27.399817518, 11.5))
            Line((27.399817518, 11.5), (35, 11.5))
            Line((35, 11.5), (35, -11.5))
            Line((35, -11.5), (27.399817518, -11.5))
            ThreePointArc((27.399817518, -11.5), (25.852186654, -11.930011924), (24.748222274, -13.096774194))
            ThreePointArc((24.748222274, -13.096774194), (0, -28), (-24.748222274, -13.096774194))
            ThreePointArc((-24.748222274, -13.096774194), (-25.852186654, -11.930011924), (-27.399817518, -11.5))
            Line((-27.399817518, -11.5), (-35, -11.5))
            Line((-35, -11.5), (-35, 11.5))
        make_face(mode=Mode.SUBTRACT)
        with Locations((94.829781714, -54.75)):
            Circle(SKETCH1_3_R, mode=Mode.SUBTRACT)
        with Locations((-94.829781714, 54.75)):
            Circle(SKETCH1_3_R, mode=Mode.SUBTRACT)
        with Locations((0, 109.5)):
            Circle(SKETCH1_3_R, mode=Mode.SUBTRACT)
        with Locations((94.829781714, 54.75)):
            Circle(SKETCH1_3_R, mode=Mode.SUBTRACT)
    extrude(amount=BOSS_EXTRUDE2_DEPTH, both=True)


solid = part.part
